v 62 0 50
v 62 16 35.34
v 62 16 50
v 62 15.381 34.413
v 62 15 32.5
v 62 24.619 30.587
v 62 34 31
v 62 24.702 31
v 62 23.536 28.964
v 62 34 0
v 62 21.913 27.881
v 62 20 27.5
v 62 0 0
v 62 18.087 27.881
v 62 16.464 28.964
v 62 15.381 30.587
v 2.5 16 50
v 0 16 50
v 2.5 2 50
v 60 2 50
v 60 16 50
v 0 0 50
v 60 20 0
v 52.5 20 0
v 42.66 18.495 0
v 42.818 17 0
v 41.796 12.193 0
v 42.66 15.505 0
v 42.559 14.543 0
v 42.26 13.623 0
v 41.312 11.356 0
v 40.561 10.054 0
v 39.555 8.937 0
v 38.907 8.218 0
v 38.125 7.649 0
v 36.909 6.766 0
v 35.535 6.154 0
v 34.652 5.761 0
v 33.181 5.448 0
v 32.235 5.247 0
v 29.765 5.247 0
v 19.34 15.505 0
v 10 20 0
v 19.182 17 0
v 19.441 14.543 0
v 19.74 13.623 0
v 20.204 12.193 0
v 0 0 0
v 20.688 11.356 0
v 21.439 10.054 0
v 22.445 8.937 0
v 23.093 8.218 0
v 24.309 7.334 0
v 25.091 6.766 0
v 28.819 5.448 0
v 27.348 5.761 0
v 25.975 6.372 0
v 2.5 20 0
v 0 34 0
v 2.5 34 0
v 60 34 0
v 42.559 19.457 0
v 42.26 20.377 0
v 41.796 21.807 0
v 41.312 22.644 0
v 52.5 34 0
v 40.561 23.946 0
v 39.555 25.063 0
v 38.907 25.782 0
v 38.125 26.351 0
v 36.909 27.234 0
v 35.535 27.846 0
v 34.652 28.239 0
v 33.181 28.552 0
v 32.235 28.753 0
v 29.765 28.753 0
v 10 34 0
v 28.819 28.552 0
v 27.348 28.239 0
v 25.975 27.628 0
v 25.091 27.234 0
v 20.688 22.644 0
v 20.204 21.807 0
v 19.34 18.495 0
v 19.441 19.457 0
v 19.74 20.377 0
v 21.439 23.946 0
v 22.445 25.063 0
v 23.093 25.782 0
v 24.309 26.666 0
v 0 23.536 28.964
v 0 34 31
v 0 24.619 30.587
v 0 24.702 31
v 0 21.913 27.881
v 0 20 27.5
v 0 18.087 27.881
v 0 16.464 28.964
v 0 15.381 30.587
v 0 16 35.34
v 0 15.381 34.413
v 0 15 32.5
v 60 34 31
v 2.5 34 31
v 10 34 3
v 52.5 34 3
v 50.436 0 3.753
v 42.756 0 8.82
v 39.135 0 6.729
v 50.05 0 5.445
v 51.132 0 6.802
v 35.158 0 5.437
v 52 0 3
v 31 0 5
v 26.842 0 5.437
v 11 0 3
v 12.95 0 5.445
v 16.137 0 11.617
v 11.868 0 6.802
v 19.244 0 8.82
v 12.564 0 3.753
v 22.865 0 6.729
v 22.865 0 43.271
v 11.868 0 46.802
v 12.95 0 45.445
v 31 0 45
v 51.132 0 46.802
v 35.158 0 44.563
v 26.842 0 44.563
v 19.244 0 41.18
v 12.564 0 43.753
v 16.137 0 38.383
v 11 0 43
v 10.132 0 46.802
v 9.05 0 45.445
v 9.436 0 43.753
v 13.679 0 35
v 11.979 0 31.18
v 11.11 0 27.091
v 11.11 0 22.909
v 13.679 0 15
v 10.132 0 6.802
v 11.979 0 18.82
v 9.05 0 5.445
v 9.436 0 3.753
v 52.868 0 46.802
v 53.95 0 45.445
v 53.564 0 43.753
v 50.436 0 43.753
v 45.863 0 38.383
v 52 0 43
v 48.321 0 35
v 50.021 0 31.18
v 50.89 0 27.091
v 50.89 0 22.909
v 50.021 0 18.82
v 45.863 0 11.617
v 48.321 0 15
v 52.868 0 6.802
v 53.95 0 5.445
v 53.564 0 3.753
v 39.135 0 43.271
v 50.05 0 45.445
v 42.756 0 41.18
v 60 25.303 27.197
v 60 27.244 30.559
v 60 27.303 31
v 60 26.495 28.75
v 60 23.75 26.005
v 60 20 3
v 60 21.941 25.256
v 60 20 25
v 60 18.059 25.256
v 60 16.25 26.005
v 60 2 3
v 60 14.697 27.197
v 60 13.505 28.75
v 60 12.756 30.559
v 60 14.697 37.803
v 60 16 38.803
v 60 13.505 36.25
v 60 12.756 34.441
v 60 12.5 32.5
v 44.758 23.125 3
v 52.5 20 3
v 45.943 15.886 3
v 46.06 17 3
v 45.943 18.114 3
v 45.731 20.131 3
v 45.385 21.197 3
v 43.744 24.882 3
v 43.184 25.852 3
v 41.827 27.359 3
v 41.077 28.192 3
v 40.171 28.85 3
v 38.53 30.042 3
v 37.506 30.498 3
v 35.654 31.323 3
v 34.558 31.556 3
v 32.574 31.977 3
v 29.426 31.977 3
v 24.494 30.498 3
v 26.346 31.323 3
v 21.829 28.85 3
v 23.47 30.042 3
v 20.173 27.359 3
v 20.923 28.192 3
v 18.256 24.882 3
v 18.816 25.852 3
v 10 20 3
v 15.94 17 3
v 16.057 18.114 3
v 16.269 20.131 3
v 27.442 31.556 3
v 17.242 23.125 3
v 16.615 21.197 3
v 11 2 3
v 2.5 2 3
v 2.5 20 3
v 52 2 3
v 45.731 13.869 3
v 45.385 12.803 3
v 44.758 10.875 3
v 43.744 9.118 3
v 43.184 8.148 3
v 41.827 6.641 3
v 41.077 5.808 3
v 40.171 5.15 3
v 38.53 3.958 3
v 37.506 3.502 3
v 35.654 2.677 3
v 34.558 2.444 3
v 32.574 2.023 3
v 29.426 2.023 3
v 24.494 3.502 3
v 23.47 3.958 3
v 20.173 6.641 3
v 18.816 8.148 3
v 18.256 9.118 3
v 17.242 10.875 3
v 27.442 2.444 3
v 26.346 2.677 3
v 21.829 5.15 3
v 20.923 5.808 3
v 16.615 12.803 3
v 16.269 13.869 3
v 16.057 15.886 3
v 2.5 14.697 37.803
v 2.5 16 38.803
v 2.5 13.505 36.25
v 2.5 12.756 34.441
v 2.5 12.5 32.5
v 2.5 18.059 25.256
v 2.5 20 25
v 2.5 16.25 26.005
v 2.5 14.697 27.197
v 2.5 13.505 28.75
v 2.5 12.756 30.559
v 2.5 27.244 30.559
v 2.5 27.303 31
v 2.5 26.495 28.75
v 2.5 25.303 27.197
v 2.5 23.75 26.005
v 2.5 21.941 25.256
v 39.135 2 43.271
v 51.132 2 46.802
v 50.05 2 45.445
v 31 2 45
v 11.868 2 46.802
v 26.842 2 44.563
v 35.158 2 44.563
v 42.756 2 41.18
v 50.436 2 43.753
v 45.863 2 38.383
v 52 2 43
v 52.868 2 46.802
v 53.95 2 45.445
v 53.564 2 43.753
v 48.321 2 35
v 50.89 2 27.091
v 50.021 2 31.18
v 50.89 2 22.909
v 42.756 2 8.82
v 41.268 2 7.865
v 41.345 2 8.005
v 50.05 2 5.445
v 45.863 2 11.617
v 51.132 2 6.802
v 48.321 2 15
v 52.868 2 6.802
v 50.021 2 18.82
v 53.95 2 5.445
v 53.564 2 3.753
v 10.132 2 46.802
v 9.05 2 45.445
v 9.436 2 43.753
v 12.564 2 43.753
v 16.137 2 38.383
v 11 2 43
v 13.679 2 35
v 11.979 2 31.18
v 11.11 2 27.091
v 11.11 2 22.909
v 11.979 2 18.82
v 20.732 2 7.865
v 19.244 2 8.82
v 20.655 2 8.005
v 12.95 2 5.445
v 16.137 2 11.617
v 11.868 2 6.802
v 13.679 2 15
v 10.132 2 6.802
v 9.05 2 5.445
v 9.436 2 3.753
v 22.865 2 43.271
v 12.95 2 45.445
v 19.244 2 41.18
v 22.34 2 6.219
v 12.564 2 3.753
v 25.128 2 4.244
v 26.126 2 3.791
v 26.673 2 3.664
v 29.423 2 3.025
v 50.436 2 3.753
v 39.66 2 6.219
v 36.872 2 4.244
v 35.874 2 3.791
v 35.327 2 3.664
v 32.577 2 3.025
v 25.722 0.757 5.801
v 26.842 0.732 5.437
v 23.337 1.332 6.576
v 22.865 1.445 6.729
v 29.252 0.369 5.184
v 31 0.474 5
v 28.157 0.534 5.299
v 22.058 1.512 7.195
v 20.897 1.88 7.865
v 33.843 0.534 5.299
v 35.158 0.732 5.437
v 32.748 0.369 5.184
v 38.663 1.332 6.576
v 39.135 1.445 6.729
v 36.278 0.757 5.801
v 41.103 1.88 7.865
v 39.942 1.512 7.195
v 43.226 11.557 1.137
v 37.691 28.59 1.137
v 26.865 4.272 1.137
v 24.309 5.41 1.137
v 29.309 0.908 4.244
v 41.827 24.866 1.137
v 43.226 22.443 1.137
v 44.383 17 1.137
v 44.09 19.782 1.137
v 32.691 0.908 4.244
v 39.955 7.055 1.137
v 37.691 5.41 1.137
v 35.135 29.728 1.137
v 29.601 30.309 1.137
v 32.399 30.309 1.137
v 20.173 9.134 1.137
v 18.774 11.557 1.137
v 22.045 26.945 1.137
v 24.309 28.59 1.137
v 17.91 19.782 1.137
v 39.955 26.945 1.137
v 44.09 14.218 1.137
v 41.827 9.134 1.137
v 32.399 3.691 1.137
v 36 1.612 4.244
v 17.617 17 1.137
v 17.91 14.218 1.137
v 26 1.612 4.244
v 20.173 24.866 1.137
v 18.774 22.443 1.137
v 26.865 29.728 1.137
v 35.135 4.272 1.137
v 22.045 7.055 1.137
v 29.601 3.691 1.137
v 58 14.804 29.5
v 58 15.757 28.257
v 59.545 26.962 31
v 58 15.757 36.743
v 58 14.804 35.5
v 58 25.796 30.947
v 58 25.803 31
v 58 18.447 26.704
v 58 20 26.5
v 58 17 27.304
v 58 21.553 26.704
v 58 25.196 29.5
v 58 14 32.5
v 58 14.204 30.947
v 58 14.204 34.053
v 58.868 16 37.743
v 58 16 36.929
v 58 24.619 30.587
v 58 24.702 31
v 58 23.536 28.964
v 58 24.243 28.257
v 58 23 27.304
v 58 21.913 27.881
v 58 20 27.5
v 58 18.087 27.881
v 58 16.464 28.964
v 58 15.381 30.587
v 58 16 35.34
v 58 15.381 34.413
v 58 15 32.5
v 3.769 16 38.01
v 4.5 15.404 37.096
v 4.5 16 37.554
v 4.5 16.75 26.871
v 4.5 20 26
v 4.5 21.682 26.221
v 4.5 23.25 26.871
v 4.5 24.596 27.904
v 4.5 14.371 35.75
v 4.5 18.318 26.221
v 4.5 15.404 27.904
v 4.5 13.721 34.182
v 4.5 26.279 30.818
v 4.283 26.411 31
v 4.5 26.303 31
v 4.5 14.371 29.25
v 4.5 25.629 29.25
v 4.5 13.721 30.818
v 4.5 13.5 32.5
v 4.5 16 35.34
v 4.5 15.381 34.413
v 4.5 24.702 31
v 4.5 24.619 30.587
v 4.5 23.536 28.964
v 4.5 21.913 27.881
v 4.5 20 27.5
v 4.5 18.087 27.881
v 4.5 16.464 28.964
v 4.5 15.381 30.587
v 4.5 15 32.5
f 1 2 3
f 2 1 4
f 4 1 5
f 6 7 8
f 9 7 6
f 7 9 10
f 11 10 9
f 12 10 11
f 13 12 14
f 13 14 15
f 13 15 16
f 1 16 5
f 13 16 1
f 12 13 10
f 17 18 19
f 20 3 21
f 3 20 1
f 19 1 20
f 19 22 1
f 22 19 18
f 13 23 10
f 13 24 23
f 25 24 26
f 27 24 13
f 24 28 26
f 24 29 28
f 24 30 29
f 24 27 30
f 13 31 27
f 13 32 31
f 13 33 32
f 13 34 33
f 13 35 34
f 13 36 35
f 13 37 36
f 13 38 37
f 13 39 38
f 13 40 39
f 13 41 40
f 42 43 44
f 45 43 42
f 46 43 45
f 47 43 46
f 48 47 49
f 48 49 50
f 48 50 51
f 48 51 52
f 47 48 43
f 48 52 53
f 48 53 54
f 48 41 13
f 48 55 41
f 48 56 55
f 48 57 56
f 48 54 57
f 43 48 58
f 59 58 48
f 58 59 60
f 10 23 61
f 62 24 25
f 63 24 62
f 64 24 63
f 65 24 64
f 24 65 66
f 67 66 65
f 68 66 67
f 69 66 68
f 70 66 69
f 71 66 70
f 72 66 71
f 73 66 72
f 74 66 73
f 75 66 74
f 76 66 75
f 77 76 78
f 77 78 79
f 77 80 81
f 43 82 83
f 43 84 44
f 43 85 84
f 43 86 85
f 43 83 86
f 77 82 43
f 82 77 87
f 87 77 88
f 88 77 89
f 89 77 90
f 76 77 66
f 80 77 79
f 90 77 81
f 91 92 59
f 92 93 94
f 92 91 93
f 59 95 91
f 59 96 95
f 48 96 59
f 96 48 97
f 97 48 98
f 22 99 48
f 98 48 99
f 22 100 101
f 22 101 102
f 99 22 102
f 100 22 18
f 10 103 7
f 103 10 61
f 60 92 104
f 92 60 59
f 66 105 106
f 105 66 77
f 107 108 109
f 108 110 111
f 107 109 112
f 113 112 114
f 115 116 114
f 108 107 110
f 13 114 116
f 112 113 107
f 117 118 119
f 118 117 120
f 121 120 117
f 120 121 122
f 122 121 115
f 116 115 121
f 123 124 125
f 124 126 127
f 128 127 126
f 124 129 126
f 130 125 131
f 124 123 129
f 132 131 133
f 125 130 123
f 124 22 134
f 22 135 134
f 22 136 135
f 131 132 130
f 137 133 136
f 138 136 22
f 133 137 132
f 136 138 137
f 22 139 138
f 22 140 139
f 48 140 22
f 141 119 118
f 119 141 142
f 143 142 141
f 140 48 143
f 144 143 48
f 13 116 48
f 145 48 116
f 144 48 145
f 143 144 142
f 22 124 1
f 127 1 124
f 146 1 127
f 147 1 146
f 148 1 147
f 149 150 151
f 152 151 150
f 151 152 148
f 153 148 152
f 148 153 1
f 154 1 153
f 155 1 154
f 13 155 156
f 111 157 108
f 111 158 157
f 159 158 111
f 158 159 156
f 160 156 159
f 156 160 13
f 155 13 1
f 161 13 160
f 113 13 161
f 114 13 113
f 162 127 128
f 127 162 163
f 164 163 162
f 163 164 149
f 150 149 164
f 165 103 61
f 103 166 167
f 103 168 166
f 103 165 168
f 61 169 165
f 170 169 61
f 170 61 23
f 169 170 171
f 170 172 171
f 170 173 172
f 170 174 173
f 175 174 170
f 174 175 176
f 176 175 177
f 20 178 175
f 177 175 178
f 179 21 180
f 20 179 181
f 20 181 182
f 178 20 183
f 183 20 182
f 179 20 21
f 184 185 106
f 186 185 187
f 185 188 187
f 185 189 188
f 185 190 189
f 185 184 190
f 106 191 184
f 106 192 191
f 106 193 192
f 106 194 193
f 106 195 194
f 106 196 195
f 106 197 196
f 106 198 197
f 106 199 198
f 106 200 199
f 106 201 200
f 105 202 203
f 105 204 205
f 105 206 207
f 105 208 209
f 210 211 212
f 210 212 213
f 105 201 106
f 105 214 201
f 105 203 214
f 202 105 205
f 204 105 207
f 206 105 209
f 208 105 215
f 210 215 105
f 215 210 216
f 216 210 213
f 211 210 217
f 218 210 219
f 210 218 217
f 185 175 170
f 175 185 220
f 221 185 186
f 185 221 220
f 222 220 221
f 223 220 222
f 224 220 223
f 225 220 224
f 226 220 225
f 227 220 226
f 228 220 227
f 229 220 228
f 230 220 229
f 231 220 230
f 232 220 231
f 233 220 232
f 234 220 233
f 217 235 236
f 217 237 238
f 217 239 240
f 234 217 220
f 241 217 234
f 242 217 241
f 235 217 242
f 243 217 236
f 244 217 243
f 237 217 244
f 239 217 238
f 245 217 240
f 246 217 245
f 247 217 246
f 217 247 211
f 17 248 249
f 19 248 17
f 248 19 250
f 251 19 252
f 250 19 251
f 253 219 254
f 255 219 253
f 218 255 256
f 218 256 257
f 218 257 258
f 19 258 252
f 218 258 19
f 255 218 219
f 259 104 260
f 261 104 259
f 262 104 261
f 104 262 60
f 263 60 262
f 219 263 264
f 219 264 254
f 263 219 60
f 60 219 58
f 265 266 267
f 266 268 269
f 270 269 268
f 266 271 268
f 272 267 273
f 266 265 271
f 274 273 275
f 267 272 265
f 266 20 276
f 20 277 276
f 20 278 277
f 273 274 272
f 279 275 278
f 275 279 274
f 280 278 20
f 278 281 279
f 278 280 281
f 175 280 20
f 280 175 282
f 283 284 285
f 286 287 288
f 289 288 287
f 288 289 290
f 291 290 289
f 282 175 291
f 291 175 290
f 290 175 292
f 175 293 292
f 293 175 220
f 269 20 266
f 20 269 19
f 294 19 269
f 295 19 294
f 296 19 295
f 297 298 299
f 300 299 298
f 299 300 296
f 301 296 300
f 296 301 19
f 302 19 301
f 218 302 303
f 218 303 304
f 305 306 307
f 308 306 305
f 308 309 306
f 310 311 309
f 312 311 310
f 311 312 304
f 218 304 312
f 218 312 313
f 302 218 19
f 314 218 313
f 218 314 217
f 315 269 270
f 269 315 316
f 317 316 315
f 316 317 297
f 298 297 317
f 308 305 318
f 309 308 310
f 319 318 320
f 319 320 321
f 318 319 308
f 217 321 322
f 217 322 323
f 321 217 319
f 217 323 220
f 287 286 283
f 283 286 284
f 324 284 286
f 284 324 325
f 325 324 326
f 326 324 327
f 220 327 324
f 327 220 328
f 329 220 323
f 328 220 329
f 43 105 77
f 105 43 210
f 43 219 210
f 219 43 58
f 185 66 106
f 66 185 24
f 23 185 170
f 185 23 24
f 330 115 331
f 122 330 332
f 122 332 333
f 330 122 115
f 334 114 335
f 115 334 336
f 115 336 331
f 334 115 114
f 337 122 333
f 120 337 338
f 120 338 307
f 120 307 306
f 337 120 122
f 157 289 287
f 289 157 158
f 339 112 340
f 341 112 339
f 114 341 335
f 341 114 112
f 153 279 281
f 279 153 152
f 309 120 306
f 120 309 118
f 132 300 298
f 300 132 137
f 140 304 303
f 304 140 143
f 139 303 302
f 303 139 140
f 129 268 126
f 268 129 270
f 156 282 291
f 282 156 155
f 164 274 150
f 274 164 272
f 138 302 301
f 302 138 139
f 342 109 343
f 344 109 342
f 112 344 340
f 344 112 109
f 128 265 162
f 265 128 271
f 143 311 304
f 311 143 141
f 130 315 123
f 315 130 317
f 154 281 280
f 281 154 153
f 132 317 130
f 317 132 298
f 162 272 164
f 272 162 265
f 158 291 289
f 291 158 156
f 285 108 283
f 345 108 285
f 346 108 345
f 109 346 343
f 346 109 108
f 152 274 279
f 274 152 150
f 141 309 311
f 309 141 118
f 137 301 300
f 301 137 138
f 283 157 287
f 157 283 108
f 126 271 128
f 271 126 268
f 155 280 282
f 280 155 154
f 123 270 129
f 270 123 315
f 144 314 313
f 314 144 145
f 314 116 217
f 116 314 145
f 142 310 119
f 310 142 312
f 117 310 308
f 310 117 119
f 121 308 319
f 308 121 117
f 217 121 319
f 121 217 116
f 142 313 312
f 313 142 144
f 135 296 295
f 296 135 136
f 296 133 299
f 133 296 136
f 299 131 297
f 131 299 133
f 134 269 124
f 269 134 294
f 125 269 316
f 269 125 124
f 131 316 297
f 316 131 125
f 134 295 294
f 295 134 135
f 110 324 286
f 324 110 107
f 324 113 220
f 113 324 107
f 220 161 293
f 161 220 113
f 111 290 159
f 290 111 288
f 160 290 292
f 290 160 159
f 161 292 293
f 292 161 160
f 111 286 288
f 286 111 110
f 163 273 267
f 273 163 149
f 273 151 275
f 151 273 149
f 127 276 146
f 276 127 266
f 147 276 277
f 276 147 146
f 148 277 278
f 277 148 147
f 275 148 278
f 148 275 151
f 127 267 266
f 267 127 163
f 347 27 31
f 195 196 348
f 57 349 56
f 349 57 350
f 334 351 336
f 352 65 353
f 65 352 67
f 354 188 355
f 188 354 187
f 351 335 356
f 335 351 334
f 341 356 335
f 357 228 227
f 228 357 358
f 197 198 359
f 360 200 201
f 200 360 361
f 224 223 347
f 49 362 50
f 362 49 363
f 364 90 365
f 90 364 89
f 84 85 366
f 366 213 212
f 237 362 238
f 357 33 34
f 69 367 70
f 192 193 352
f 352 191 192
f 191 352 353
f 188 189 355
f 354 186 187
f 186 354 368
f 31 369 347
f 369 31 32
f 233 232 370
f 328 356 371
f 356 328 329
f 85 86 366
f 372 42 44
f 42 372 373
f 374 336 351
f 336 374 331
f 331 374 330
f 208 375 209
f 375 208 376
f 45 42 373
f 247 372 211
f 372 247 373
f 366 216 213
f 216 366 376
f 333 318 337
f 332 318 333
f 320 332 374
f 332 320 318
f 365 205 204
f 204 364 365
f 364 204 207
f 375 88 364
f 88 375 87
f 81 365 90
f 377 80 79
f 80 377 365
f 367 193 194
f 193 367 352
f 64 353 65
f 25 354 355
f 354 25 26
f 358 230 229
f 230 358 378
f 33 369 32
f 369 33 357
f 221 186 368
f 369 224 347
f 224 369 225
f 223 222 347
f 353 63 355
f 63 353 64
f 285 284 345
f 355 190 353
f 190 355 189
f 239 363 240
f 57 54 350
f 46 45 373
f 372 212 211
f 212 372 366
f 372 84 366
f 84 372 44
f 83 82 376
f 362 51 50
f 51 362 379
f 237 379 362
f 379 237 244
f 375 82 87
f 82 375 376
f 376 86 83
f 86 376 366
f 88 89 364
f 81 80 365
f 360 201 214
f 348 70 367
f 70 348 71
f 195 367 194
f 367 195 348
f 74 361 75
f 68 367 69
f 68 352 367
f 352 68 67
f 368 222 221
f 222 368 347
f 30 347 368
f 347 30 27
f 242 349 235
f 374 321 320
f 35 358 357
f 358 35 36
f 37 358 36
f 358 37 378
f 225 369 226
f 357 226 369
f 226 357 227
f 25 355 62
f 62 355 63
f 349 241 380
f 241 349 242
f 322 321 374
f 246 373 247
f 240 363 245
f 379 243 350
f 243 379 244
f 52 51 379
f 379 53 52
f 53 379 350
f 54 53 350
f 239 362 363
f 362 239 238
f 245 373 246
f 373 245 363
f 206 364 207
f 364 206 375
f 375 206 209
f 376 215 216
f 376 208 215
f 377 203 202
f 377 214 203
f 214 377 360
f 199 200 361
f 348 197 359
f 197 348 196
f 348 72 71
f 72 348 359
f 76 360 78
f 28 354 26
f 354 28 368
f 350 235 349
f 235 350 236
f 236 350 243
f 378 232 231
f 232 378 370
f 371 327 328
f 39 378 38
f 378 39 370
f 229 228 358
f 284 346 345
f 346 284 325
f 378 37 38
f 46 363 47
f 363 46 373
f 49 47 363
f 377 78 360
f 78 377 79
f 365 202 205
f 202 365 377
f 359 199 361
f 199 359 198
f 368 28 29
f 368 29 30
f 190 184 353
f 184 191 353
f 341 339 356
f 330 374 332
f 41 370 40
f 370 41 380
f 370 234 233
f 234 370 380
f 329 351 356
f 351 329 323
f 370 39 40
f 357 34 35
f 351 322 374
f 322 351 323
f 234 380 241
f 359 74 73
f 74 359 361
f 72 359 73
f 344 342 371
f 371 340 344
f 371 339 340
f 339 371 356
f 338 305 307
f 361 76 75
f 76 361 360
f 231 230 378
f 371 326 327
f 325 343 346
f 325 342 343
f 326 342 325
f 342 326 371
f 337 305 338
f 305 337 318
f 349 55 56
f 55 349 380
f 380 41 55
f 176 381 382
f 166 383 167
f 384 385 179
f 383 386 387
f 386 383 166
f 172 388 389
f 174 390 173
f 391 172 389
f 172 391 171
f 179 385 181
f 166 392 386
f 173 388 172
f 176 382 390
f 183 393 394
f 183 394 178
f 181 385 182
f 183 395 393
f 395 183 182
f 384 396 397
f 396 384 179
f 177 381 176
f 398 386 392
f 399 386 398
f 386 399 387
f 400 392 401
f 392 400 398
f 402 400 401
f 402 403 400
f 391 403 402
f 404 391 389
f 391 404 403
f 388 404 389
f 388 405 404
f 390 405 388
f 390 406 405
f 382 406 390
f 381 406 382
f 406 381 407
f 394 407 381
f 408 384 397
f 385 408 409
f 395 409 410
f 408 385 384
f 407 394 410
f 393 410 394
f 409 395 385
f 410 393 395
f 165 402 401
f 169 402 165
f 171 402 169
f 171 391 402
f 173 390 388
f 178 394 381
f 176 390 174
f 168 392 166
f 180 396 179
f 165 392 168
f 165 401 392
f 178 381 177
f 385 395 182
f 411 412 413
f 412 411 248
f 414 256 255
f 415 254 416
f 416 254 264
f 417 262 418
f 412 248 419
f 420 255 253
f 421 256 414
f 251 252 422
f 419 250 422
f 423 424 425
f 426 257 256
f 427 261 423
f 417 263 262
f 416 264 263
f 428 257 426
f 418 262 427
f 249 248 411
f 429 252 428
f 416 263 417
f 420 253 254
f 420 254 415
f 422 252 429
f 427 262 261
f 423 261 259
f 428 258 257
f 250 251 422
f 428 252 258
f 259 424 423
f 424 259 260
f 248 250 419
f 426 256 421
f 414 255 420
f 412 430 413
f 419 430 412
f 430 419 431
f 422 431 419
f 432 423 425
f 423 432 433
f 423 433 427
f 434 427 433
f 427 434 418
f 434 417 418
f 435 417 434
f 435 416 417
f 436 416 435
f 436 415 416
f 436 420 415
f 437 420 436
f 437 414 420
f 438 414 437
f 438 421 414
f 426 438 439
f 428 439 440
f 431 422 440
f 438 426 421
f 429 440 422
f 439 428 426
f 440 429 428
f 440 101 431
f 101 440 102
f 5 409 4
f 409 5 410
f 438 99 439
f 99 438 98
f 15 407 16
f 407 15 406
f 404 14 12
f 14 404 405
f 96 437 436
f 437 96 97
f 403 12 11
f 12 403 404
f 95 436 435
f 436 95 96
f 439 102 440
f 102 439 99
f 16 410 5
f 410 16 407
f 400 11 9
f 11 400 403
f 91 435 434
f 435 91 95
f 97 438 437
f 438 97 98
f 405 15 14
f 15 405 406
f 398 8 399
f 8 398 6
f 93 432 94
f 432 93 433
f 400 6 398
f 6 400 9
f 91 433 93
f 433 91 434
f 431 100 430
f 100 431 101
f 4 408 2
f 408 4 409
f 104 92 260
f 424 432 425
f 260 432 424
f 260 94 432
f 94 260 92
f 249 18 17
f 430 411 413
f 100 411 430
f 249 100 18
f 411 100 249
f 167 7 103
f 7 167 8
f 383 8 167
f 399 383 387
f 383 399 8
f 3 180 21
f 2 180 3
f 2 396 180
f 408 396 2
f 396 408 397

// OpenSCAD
//!OpenSCAD
//
// printrbot LC toolless fan shroud
//
//snap fit for part and hotend cooling
//

module fanshroud()
{
    difference(){
    //add lip to sides
    union(){
    difference(){
        cube([62, 34, 50]);
        //cutout center
        translate([2.5,2,3]){
            cube([57.5, 35, 55]);
        }
        //cutout bottom left
        translate([2.5,20,0]){
            cube([7.5, 32, 50]);
        }
        //cutout bottom right
        translate([52.5,20,0]){
            cube([7.5, 32, 50]);
        }
        //cutout fan
        translate([31,0,25]){
            rotate([0,90,90])
            cylinder(h=5, r=20);
        }
        translate([11.5,2,5]){
            cube([40, 30, 50]);
        }
        //cutout fan screws
        translate([11,0,5]){
            rotate([0,90,90])
            cylinder(h=50, r=2);
        }
        translate([11,0,45]){
            rotate([0,90,90])
            cylinder(h=50, r=2);
        }
        translate([52,0,5]){
            rotate([0,90,90])
            cylinder(h=50, r=2);
        }
        translate([52,0,45]){
            rotate([0,90,90])
            cylinder(h=50, r=2);
        }
        //cutout nozzle
        translate([31,17,16]){
            sphere(r=20);
        }
    }
    //add lip
    translate([58,20,32.5]){
        rotate([0,90,0])
        cylinder(h=2, r1=6, r2=7.5);
    }
    translate([2.5,20,32.5]){
        rotate([0,90,0])
        cylinder(h=2, r1=7.5, r2=6.5);
    }
    }
    //cutout side holes
    translate([0,20,32.5]){
        rotate([0,90,0])
        cylinder(h=62, r=5);
    }
    //cutout wire notch
    translate([0,16,31]){
        cube([5,20,20]);
    } translate([58,16,31]){
        cube([5,20,20]);
    }
    }
}

//**************************
// create the object

fanshroud();
